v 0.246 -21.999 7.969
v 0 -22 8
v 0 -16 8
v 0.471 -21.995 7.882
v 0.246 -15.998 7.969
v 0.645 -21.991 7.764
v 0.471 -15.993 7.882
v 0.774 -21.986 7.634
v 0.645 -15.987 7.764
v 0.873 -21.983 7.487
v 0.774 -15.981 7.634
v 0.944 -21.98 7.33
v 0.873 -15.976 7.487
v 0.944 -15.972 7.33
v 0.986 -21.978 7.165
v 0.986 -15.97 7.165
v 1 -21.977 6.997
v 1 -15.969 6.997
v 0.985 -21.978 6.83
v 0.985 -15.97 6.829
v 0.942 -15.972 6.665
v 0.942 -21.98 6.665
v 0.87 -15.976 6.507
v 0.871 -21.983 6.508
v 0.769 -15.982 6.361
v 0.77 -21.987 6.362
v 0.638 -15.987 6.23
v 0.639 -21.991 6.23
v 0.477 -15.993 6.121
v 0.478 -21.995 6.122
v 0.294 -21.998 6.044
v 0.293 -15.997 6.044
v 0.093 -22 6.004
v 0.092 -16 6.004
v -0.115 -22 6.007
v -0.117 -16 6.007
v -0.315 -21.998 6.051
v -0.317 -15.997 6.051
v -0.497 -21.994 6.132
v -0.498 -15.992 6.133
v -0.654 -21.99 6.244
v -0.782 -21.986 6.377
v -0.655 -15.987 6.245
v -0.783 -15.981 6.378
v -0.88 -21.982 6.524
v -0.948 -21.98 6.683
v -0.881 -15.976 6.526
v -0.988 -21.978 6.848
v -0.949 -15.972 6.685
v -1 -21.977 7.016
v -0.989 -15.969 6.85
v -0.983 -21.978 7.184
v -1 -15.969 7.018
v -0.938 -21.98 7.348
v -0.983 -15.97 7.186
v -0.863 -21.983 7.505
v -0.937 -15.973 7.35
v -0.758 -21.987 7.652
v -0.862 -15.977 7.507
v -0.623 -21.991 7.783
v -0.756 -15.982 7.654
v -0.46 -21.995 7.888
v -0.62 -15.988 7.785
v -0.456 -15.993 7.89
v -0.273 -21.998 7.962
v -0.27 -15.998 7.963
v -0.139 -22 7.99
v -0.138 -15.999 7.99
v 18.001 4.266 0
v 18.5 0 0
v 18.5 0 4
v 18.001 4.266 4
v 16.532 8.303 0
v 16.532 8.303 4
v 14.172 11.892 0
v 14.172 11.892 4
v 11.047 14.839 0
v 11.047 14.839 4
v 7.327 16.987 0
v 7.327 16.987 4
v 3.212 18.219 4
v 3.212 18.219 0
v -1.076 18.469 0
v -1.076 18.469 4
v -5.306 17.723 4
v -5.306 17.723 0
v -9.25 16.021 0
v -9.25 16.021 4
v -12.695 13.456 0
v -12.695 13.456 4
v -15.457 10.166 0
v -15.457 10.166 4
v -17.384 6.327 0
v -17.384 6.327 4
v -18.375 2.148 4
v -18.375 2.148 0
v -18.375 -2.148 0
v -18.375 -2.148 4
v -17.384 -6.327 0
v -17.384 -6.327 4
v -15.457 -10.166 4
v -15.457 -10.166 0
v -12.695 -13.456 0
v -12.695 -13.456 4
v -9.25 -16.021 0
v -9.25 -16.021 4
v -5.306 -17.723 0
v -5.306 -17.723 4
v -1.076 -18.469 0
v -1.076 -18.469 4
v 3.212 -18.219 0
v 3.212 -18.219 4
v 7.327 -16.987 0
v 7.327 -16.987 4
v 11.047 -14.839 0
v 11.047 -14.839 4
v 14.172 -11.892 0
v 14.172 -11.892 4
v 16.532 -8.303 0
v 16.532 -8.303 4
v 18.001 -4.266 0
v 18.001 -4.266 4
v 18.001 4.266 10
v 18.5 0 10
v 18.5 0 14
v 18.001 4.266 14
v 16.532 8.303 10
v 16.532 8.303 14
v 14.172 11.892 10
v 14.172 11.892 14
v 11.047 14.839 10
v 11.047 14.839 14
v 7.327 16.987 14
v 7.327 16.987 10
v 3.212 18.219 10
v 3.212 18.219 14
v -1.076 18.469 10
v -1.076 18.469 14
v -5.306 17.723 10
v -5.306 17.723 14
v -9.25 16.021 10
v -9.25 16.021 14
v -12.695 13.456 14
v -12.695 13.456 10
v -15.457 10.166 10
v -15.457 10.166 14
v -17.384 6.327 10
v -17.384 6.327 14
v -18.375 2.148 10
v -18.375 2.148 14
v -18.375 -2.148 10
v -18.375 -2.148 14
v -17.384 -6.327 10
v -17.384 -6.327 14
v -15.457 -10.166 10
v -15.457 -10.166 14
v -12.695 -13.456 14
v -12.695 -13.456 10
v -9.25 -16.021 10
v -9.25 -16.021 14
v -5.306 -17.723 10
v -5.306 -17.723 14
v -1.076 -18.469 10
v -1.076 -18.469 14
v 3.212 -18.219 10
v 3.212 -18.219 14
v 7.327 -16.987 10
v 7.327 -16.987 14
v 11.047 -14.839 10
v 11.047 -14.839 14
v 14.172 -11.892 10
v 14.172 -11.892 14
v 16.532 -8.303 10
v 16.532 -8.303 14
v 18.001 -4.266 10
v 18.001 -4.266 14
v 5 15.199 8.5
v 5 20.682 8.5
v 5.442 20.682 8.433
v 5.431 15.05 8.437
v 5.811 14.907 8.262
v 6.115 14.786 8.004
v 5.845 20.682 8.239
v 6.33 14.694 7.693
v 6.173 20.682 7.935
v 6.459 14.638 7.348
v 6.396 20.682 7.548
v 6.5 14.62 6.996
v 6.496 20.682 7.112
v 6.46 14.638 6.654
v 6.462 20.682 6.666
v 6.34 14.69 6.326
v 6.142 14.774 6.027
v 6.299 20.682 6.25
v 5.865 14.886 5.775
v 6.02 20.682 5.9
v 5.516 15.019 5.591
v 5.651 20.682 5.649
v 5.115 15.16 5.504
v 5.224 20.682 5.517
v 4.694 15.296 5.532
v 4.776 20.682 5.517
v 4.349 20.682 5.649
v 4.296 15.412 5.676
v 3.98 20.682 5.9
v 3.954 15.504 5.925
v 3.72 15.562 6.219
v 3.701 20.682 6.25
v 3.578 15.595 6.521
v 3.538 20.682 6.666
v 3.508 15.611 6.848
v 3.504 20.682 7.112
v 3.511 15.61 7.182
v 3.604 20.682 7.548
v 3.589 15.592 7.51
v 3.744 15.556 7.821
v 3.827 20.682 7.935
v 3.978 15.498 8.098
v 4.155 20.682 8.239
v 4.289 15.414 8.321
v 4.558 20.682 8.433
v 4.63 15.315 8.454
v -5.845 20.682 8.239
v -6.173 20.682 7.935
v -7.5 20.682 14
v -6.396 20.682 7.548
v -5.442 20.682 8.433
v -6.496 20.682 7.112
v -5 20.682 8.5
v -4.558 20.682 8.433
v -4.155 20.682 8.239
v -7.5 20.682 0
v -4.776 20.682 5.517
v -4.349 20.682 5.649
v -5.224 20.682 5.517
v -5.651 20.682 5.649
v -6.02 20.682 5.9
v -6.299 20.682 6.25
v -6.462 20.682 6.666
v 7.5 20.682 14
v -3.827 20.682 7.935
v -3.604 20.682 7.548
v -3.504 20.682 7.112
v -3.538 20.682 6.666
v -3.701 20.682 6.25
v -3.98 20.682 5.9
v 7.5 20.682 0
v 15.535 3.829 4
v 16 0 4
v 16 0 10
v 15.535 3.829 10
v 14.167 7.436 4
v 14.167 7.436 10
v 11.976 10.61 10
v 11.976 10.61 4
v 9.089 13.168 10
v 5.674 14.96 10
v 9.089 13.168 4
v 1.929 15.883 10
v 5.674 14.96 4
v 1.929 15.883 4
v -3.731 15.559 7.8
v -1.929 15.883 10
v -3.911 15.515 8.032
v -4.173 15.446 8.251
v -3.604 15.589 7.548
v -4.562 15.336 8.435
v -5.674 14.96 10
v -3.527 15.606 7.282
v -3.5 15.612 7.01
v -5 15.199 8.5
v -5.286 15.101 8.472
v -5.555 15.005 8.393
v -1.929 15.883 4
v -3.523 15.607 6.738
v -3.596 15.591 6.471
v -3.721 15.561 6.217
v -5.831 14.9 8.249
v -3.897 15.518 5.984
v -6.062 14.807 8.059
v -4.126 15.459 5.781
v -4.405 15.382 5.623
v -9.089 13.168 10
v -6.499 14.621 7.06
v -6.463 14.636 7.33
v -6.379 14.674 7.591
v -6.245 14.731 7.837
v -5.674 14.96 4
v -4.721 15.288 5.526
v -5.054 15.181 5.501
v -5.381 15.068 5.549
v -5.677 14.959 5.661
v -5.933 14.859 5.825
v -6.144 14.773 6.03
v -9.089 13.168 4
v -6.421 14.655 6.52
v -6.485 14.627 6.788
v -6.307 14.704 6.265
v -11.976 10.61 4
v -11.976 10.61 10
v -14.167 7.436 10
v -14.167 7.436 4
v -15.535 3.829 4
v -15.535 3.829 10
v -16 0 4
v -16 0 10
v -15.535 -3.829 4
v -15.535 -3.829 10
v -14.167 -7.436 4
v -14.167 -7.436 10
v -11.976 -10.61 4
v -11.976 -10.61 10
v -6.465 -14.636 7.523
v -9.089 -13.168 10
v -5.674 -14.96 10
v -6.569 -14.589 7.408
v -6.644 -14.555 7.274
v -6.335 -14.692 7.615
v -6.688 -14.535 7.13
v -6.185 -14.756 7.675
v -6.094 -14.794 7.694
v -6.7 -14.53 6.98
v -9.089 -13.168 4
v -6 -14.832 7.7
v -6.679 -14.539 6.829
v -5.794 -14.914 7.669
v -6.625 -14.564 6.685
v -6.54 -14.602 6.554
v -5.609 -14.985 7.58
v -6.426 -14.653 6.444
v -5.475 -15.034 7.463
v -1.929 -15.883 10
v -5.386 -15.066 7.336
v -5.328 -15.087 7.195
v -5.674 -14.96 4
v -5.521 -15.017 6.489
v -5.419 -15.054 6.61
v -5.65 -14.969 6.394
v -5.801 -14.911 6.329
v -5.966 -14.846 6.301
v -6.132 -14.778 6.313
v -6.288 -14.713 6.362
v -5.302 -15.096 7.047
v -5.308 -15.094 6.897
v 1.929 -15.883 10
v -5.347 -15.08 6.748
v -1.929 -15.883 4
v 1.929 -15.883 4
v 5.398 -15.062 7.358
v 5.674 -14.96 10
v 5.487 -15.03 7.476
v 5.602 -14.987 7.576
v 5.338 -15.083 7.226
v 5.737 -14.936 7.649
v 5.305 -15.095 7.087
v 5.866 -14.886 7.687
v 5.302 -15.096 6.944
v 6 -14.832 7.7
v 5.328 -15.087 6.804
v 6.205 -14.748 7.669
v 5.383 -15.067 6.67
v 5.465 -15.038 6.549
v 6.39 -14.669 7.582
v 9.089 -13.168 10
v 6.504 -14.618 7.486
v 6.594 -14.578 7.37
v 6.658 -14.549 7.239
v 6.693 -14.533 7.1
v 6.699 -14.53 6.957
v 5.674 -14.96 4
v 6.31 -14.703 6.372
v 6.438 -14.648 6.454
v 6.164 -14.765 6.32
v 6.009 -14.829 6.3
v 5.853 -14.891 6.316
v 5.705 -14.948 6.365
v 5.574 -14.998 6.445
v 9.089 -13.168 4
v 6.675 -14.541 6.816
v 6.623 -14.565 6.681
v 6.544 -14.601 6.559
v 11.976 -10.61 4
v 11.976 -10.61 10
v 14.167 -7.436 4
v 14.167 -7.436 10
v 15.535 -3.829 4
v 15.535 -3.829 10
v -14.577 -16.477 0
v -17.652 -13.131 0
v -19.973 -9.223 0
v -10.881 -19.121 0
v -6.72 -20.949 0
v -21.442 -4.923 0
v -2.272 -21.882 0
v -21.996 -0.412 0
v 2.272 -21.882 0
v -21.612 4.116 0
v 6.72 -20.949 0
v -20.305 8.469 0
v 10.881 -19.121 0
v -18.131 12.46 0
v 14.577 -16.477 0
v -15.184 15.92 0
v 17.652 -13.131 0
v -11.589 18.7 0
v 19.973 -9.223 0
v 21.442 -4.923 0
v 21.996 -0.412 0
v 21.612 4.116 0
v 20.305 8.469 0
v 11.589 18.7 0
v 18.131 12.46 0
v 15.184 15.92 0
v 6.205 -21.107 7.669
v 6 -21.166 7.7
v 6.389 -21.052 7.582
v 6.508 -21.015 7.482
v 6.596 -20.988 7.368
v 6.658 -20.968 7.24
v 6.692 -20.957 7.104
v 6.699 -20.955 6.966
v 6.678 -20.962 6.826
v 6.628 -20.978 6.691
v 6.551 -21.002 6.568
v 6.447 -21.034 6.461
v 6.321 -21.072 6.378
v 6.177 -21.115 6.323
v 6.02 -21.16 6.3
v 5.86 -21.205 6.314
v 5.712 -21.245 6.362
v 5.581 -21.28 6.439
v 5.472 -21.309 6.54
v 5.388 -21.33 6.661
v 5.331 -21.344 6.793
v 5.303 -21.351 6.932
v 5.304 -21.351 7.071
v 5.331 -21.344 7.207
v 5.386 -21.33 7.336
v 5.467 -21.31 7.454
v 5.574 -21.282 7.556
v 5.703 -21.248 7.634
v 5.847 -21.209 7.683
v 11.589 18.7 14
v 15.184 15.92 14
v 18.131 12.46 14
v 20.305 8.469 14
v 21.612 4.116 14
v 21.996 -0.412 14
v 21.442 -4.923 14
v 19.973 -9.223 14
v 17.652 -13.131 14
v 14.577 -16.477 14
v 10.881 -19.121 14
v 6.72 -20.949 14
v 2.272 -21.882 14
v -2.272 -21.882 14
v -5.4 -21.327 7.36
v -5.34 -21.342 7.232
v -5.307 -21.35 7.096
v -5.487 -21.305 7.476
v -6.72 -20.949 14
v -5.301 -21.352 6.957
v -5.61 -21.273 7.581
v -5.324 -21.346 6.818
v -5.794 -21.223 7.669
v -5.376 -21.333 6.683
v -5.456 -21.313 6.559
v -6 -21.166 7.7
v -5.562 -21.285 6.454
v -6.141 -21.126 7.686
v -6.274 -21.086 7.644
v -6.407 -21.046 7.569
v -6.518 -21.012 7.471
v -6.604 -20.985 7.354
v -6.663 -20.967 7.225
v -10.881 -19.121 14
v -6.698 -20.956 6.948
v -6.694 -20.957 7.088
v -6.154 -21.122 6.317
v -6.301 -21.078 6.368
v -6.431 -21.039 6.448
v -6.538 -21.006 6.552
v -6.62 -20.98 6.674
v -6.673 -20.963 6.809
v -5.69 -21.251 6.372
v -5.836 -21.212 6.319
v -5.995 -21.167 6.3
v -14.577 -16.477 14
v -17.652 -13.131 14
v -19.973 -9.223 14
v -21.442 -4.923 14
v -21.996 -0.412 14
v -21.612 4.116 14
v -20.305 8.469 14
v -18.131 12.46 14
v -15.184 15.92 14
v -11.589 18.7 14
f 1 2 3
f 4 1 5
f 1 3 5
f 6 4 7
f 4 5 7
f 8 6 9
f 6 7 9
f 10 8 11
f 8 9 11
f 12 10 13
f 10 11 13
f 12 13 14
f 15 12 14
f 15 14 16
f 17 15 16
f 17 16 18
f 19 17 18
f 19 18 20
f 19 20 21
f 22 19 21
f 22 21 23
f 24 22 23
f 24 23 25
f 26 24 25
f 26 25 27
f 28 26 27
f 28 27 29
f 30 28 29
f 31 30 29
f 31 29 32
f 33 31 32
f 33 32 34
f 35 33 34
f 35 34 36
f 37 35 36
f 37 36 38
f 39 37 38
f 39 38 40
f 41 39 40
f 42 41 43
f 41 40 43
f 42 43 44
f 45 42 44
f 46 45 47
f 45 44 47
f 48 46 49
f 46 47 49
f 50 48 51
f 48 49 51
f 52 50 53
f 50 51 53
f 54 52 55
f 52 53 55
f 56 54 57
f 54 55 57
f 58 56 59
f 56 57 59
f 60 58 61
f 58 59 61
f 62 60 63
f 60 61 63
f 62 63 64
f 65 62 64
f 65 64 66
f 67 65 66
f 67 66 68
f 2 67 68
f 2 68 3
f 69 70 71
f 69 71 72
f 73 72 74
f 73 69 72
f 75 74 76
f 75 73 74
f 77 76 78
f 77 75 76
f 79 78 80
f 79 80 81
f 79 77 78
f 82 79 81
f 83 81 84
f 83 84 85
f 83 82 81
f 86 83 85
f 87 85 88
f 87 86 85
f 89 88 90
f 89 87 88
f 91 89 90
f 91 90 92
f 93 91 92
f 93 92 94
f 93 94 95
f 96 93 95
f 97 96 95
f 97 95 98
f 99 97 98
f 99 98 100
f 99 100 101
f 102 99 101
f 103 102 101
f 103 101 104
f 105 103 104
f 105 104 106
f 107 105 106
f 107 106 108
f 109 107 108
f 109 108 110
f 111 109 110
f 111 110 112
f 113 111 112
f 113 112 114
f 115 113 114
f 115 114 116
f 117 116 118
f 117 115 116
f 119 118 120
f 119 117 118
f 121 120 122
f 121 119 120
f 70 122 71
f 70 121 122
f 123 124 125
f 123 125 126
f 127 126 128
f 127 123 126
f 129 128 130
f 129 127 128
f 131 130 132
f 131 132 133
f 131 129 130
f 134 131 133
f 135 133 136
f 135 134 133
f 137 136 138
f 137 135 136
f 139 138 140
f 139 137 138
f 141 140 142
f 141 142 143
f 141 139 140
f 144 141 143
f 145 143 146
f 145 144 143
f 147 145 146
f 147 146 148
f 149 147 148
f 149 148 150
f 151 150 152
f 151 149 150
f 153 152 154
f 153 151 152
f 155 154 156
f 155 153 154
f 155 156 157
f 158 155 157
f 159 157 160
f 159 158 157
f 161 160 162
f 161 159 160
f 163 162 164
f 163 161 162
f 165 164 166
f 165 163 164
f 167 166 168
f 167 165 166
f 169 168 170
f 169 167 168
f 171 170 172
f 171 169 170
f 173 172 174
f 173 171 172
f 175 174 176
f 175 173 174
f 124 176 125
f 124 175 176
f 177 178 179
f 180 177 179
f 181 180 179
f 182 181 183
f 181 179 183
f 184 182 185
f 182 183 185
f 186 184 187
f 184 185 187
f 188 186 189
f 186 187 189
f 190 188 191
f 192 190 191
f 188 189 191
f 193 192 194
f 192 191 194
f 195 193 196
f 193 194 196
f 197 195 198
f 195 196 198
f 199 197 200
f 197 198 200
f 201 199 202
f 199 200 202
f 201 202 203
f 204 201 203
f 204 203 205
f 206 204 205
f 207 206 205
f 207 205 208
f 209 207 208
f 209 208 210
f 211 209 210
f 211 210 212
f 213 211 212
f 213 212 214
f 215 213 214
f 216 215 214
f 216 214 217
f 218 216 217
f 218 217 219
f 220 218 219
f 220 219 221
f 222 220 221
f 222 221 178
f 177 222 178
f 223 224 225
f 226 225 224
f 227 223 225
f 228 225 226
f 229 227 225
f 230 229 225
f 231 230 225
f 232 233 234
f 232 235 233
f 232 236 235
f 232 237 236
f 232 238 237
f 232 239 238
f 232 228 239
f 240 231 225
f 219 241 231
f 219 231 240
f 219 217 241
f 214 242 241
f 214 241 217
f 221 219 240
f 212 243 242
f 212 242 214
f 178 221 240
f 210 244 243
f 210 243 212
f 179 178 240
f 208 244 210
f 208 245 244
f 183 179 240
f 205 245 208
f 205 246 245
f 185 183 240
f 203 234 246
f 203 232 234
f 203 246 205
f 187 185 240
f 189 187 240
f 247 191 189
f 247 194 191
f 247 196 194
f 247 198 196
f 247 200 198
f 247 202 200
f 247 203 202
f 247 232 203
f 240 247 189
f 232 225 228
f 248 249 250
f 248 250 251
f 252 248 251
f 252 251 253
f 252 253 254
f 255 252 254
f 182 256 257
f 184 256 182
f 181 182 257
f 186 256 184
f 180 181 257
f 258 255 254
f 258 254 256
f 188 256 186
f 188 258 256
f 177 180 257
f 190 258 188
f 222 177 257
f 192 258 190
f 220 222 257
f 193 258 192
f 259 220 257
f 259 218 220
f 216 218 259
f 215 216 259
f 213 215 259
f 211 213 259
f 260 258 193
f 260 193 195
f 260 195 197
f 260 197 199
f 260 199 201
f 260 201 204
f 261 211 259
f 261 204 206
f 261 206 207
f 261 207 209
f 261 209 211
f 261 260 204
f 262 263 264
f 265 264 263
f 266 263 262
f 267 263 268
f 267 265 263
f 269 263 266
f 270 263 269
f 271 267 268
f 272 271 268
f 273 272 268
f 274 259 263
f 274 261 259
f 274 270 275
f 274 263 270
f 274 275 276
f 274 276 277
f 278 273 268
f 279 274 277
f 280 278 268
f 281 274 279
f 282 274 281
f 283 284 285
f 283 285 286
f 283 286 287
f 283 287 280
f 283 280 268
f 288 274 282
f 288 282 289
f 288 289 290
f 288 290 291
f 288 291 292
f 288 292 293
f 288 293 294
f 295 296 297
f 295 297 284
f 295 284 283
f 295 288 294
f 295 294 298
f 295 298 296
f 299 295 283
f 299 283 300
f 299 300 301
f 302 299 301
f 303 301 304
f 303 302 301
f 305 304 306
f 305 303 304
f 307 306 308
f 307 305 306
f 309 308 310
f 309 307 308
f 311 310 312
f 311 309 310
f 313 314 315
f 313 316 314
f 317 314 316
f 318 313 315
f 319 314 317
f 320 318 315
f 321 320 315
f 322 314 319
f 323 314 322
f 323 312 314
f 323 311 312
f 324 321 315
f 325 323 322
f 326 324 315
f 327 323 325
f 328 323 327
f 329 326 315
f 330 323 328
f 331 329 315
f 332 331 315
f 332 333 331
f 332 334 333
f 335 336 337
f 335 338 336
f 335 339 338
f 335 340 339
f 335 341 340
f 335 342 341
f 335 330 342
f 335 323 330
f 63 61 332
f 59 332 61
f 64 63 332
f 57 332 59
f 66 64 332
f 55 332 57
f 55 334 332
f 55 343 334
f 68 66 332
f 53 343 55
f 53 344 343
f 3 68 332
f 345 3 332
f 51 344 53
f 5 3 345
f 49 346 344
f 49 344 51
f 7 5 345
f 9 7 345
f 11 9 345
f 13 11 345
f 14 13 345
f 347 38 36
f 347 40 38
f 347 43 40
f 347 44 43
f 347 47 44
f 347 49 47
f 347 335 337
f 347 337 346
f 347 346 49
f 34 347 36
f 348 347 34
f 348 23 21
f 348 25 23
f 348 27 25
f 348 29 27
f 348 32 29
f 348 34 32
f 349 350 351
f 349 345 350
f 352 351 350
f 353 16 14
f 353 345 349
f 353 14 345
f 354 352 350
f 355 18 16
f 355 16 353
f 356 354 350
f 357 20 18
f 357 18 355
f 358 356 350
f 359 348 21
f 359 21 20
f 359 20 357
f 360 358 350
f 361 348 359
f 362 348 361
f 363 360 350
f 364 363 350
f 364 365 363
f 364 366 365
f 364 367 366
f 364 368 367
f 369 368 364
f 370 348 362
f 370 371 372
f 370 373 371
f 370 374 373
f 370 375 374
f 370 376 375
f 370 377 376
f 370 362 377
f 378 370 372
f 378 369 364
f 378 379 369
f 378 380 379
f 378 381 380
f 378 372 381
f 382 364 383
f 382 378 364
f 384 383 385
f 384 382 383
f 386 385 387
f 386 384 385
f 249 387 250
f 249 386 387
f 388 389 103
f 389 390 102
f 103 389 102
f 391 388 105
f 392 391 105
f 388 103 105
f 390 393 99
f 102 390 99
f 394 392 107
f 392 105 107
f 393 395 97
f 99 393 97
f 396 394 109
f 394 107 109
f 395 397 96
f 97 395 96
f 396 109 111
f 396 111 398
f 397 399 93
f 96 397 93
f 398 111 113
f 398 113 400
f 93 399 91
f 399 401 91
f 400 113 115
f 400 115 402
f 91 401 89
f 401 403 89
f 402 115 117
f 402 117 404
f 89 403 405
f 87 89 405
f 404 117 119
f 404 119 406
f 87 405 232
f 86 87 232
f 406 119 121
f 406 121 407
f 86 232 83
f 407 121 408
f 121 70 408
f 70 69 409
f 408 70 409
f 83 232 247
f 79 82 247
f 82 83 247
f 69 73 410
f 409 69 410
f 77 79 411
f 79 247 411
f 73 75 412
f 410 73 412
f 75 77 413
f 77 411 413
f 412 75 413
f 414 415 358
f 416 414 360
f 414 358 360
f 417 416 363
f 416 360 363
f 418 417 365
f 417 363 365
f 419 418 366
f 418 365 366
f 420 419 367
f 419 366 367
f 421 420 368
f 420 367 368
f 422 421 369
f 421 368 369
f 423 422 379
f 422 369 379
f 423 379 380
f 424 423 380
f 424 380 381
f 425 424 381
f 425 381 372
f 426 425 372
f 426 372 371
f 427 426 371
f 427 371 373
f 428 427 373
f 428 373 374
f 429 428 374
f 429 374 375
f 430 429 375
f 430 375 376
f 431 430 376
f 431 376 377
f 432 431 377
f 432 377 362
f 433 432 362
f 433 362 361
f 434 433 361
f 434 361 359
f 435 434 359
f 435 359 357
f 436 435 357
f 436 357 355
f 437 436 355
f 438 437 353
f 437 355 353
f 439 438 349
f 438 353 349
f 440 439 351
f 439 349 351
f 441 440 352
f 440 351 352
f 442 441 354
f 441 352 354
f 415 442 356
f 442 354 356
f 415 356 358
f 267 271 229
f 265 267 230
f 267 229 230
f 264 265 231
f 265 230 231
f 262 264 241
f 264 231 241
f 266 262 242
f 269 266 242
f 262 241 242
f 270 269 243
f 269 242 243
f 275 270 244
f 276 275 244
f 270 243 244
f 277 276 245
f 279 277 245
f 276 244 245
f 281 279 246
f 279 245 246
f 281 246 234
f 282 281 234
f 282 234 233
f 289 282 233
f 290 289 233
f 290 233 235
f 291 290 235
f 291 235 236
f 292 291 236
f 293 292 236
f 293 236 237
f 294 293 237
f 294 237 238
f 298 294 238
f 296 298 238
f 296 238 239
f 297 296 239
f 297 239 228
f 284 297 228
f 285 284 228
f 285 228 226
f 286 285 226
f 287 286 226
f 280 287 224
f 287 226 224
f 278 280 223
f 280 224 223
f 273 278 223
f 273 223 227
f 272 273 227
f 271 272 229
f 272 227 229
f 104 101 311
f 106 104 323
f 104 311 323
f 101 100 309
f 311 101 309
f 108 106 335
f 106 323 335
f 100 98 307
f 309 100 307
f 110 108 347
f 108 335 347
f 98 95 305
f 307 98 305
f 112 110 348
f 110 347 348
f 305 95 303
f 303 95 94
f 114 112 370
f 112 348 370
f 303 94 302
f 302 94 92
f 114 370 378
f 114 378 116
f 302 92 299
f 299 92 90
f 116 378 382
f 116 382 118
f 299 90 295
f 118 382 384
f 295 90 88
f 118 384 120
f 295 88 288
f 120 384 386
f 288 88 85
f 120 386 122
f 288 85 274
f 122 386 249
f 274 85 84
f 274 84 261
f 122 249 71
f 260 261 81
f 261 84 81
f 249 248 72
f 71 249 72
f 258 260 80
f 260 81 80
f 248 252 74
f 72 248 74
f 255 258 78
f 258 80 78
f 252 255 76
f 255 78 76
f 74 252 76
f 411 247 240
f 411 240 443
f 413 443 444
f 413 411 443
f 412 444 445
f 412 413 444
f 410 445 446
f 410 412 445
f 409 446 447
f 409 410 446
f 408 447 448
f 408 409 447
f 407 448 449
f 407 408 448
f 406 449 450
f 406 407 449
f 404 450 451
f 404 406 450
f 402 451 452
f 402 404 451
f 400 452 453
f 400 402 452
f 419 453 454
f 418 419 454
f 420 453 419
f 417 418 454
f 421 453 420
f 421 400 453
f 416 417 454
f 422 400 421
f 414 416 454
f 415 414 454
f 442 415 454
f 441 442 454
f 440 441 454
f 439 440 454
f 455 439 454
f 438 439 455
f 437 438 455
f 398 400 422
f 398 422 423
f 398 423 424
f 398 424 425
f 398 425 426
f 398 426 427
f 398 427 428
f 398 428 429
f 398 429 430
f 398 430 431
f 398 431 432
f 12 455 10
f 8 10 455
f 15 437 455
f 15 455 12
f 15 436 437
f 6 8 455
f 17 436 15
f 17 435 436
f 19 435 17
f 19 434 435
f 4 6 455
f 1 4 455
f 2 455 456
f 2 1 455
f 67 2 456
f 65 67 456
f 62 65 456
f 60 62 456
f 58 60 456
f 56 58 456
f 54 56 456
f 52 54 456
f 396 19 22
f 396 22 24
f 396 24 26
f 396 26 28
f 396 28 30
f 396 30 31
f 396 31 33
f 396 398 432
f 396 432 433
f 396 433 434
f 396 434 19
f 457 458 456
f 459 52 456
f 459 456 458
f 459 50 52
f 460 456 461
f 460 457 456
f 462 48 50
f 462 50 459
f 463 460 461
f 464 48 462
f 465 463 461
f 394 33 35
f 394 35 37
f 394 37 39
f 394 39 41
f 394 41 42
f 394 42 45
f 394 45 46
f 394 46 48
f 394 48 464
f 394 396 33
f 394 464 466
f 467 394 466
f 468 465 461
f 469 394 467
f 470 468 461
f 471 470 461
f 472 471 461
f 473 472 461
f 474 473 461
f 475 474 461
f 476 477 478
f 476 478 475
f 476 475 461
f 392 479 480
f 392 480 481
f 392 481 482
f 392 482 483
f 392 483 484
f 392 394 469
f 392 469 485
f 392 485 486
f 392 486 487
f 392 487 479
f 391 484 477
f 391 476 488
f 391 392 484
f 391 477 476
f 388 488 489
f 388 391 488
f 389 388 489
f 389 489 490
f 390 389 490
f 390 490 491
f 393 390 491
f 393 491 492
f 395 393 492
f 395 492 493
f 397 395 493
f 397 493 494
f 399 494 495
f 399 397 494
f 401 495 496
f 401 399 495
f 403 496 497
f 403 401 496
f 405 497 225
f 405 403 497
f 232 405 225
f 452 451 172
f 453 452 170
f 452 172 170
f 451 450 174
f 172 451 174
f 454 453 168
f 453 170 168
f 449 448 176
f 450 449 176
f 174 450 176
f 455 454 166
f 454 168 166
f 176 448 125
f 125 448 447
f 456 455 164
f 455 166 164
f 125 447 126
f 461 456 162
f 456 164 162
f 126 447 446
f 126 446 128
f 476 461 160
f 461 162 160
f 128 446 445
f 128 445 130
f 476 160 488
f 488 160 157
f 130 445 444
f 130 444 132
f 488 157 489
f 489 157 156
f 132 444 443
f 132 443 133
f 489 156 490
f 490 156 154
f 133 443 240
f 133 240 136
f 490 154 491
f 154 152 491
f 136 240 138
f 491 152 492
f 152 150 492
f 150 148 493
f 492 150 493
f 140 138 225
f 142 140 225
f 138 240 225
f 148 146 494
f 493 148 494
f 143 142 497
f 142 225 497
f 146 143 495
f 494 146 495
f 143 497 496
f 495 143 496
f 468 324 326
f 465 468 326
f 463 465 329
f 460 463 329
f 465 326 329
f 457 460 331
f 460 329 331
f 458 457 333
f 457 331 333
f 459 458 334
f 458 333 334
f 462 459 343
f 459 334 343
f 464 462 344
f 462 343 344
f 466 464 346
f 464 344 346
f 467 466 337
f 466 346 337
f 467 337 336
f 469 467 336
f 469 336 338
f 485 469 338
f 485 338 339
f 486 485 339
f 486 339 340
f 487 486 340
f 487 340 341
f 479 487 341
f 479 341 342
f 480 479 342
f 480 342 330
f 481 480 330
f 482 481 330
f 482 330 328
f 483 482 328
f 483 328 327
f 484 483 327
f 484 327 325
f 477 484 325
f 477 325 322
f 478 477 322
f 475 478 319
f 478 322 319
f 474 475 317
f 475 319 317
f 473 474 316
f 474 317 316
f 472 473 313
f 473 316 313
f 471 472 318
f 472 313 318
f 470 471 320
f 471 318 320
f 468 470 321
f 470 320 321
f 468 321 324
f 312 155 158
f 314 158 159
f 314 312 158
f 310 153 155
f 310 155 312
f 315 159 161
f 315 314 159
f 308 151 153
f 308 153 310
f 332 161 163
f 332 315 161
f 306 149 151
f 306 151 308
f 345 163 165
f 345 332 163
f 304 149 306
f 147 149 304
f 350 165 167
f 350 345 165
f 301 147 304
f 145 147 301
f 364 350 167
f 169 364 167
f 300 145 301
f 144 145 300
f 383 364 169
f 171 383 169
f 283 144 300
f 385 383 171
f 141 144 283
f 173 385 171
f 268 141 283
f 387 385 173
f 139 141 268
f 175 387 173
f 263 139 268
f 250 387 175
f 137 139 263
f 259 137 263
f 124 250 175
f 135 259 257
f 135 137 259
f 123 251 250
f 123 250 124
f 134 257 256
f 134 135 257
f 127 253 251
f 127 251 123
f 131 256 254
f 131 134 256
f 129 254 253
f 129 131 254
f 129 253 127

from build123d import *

# Parameters (mm, degrees)
SKETCH_1_R               = 22
SKETCH_1_R_2             = 18.5
EXTRUDE_1_DEPTH          = 10
EXTRUDE_START            = -6
SKETCH_2_R               = 18.5
SKETCH_2_R_2             = 16
EXTRUDE_2_DEPTH          = 6
CUT_EXTRUDE_3_DEPTH      = 33.680269277
CUT_EXTRUDE_4_REACH      = 51.049
CUT_EXTRUDE_4_END_RADIUS = 16
SKETCH_8_R               = 1.5
SKETCH_10_R              = 1
SKETCH_10_R_2            = 0.7
CUT_EXTRUDE_5_DEPTH      = 33.680269307
SKETCH_11_R              = 18.5
EXTRUDE_3_DEPTH          = 4


with BuildPart() as part:
    # 草图1 → 凸台-拉伸1 (new body)
    with BuildSketch(Plane.XY):
        Circle(SKETCH_1_R)
        Circle(SKETCH_1_R_2, mode=Mode.SUBTRACT)
    extrude(amount=EXTRUDE_1_DEPTH)

    # 草图2 → 凸台-拉伸2 (add)
    with BuildSketch(Plane.XY.offset(10).offset(EXTRUDE_START)):
        Circle(SKETCH_2_R)
        Circle(SKETCH_2_R_2, mode=Mode.SUBTRACT)
    extrude(amount=EXTRUDE_2_DEPTH)

    # 草图7 → 切除-拉伸3 (cut, through all)
    with BuildSketch(Plane.XY.offset(10)):
        with BuildLine():
            Line((-7.5, 20.68211788), (7.5, 20.68211788))
            ThreePointArc((7.5, 20.68211788), (0, 22), (-7.5, 20.68211788))
        make_face()
    extrude(amount=-CUT_EXTRUDE_3_DEPTH, mode=Mode.SUBTRACT)

    # 切除-拉伸4: up to this cylinder (the profile starts outside it)
    cut_extrude_4_end = Plane(origin=(0, 0, 7), z_dir=(0, 0, 1)) * Cylinder(CUT_EXTRUDE_4_END_RADIUS, 135.098, mode=Mode.PRIVATE)
    # 草图8 → 切除-拉伸4 (cut, up to the surface)
    with BuildSketch(Plane(origin=(0, 20.68211788, 0), x_dir=(1, 0, 0), z_dir=(0, 1, 0)), mode=Mode.PRIVATE) as cut_extrude_4_sk1:
        with Locations(Location((-5, -7, 0), (0, 0, 270))):
            Circle(SKETCH_8_R)
    cut_extrude_4_tool1 = extrude(cut_extrude_4_sk1.sketch, amount=-CUT_EXTRUDE_4_REACH, mode=Mode.PRIVATE) - cut_extrude_4_end
    add(cut_extrude_4_tool1.solids().sort_by_distance((-5, 20.682118, 7))[0], mode=Mode.SUBTRACT)
    # 草图8 → 切除-拉伸4 (cut, up to the surface)
    with BuildSketch(Plane(origin=(0, 20.68211788, 0), x_dir=(1, 0, 0), z_dir=(0, 1, 0)), mode=Mode.PRIVATE) as cut_extrude_4_sk2:
        with Locations(Location((5, -7, 0), (0, 0, 270))):
            Circle(SKETCH_8_R)
    cut_extrude_4_tool2 = extrude(cut_extrude_4_sk2.sketch, amount=-CUT_EXTRUDE_4_REACH, mode=Mode.PRIVATE) - cut_extrude_4_end
    add(cut_extrude_4_tool2.solids().sort_by_distance((5, 20.682118, 7))[0], mode=Mode.SUBTRACT)

    # 草图10 → 切除-拉伸5 (cut, through all)
    with BuildSketch(Plane(origin=(0, 0, 0), x_dir=(1, 0, 0), z_dir=(0, 1, 0))):
        with Locations(Location((0, -7, 0), (0, 0, 270))):
            Circle(SKETCH_10_R)
        with Locations(Location((-6, -7, 0), (0, 0, 270))):
            Circle(SKETCH_10_R_2)
        with Locations(Location((6, -7, 0), (0, 0, 270))):
            Circle(SKETCH_10_R_2)
    extrude(amount=-CUT_EXTRUDE_5_DEPTH, mode=Mode.SUBTRACT)

    # 草图11 → 凸台-拉伸3 (add)
    with BuildSketch(Plane.XY.offset(10)):
        with BuildLine():
            Line((-7.5, 20.68211788), (7.5, 20.68211788))
            ThreePointArc((7.5, 20.68211788), (0, -22), (-7.5, 20.68211788))
        make_face()
        Circle(SKETCH_11_R, mode=Mode.SUBTRACT)
    extrude(amount=EXTRUDE_3_DEPTH)


solid = part.part
